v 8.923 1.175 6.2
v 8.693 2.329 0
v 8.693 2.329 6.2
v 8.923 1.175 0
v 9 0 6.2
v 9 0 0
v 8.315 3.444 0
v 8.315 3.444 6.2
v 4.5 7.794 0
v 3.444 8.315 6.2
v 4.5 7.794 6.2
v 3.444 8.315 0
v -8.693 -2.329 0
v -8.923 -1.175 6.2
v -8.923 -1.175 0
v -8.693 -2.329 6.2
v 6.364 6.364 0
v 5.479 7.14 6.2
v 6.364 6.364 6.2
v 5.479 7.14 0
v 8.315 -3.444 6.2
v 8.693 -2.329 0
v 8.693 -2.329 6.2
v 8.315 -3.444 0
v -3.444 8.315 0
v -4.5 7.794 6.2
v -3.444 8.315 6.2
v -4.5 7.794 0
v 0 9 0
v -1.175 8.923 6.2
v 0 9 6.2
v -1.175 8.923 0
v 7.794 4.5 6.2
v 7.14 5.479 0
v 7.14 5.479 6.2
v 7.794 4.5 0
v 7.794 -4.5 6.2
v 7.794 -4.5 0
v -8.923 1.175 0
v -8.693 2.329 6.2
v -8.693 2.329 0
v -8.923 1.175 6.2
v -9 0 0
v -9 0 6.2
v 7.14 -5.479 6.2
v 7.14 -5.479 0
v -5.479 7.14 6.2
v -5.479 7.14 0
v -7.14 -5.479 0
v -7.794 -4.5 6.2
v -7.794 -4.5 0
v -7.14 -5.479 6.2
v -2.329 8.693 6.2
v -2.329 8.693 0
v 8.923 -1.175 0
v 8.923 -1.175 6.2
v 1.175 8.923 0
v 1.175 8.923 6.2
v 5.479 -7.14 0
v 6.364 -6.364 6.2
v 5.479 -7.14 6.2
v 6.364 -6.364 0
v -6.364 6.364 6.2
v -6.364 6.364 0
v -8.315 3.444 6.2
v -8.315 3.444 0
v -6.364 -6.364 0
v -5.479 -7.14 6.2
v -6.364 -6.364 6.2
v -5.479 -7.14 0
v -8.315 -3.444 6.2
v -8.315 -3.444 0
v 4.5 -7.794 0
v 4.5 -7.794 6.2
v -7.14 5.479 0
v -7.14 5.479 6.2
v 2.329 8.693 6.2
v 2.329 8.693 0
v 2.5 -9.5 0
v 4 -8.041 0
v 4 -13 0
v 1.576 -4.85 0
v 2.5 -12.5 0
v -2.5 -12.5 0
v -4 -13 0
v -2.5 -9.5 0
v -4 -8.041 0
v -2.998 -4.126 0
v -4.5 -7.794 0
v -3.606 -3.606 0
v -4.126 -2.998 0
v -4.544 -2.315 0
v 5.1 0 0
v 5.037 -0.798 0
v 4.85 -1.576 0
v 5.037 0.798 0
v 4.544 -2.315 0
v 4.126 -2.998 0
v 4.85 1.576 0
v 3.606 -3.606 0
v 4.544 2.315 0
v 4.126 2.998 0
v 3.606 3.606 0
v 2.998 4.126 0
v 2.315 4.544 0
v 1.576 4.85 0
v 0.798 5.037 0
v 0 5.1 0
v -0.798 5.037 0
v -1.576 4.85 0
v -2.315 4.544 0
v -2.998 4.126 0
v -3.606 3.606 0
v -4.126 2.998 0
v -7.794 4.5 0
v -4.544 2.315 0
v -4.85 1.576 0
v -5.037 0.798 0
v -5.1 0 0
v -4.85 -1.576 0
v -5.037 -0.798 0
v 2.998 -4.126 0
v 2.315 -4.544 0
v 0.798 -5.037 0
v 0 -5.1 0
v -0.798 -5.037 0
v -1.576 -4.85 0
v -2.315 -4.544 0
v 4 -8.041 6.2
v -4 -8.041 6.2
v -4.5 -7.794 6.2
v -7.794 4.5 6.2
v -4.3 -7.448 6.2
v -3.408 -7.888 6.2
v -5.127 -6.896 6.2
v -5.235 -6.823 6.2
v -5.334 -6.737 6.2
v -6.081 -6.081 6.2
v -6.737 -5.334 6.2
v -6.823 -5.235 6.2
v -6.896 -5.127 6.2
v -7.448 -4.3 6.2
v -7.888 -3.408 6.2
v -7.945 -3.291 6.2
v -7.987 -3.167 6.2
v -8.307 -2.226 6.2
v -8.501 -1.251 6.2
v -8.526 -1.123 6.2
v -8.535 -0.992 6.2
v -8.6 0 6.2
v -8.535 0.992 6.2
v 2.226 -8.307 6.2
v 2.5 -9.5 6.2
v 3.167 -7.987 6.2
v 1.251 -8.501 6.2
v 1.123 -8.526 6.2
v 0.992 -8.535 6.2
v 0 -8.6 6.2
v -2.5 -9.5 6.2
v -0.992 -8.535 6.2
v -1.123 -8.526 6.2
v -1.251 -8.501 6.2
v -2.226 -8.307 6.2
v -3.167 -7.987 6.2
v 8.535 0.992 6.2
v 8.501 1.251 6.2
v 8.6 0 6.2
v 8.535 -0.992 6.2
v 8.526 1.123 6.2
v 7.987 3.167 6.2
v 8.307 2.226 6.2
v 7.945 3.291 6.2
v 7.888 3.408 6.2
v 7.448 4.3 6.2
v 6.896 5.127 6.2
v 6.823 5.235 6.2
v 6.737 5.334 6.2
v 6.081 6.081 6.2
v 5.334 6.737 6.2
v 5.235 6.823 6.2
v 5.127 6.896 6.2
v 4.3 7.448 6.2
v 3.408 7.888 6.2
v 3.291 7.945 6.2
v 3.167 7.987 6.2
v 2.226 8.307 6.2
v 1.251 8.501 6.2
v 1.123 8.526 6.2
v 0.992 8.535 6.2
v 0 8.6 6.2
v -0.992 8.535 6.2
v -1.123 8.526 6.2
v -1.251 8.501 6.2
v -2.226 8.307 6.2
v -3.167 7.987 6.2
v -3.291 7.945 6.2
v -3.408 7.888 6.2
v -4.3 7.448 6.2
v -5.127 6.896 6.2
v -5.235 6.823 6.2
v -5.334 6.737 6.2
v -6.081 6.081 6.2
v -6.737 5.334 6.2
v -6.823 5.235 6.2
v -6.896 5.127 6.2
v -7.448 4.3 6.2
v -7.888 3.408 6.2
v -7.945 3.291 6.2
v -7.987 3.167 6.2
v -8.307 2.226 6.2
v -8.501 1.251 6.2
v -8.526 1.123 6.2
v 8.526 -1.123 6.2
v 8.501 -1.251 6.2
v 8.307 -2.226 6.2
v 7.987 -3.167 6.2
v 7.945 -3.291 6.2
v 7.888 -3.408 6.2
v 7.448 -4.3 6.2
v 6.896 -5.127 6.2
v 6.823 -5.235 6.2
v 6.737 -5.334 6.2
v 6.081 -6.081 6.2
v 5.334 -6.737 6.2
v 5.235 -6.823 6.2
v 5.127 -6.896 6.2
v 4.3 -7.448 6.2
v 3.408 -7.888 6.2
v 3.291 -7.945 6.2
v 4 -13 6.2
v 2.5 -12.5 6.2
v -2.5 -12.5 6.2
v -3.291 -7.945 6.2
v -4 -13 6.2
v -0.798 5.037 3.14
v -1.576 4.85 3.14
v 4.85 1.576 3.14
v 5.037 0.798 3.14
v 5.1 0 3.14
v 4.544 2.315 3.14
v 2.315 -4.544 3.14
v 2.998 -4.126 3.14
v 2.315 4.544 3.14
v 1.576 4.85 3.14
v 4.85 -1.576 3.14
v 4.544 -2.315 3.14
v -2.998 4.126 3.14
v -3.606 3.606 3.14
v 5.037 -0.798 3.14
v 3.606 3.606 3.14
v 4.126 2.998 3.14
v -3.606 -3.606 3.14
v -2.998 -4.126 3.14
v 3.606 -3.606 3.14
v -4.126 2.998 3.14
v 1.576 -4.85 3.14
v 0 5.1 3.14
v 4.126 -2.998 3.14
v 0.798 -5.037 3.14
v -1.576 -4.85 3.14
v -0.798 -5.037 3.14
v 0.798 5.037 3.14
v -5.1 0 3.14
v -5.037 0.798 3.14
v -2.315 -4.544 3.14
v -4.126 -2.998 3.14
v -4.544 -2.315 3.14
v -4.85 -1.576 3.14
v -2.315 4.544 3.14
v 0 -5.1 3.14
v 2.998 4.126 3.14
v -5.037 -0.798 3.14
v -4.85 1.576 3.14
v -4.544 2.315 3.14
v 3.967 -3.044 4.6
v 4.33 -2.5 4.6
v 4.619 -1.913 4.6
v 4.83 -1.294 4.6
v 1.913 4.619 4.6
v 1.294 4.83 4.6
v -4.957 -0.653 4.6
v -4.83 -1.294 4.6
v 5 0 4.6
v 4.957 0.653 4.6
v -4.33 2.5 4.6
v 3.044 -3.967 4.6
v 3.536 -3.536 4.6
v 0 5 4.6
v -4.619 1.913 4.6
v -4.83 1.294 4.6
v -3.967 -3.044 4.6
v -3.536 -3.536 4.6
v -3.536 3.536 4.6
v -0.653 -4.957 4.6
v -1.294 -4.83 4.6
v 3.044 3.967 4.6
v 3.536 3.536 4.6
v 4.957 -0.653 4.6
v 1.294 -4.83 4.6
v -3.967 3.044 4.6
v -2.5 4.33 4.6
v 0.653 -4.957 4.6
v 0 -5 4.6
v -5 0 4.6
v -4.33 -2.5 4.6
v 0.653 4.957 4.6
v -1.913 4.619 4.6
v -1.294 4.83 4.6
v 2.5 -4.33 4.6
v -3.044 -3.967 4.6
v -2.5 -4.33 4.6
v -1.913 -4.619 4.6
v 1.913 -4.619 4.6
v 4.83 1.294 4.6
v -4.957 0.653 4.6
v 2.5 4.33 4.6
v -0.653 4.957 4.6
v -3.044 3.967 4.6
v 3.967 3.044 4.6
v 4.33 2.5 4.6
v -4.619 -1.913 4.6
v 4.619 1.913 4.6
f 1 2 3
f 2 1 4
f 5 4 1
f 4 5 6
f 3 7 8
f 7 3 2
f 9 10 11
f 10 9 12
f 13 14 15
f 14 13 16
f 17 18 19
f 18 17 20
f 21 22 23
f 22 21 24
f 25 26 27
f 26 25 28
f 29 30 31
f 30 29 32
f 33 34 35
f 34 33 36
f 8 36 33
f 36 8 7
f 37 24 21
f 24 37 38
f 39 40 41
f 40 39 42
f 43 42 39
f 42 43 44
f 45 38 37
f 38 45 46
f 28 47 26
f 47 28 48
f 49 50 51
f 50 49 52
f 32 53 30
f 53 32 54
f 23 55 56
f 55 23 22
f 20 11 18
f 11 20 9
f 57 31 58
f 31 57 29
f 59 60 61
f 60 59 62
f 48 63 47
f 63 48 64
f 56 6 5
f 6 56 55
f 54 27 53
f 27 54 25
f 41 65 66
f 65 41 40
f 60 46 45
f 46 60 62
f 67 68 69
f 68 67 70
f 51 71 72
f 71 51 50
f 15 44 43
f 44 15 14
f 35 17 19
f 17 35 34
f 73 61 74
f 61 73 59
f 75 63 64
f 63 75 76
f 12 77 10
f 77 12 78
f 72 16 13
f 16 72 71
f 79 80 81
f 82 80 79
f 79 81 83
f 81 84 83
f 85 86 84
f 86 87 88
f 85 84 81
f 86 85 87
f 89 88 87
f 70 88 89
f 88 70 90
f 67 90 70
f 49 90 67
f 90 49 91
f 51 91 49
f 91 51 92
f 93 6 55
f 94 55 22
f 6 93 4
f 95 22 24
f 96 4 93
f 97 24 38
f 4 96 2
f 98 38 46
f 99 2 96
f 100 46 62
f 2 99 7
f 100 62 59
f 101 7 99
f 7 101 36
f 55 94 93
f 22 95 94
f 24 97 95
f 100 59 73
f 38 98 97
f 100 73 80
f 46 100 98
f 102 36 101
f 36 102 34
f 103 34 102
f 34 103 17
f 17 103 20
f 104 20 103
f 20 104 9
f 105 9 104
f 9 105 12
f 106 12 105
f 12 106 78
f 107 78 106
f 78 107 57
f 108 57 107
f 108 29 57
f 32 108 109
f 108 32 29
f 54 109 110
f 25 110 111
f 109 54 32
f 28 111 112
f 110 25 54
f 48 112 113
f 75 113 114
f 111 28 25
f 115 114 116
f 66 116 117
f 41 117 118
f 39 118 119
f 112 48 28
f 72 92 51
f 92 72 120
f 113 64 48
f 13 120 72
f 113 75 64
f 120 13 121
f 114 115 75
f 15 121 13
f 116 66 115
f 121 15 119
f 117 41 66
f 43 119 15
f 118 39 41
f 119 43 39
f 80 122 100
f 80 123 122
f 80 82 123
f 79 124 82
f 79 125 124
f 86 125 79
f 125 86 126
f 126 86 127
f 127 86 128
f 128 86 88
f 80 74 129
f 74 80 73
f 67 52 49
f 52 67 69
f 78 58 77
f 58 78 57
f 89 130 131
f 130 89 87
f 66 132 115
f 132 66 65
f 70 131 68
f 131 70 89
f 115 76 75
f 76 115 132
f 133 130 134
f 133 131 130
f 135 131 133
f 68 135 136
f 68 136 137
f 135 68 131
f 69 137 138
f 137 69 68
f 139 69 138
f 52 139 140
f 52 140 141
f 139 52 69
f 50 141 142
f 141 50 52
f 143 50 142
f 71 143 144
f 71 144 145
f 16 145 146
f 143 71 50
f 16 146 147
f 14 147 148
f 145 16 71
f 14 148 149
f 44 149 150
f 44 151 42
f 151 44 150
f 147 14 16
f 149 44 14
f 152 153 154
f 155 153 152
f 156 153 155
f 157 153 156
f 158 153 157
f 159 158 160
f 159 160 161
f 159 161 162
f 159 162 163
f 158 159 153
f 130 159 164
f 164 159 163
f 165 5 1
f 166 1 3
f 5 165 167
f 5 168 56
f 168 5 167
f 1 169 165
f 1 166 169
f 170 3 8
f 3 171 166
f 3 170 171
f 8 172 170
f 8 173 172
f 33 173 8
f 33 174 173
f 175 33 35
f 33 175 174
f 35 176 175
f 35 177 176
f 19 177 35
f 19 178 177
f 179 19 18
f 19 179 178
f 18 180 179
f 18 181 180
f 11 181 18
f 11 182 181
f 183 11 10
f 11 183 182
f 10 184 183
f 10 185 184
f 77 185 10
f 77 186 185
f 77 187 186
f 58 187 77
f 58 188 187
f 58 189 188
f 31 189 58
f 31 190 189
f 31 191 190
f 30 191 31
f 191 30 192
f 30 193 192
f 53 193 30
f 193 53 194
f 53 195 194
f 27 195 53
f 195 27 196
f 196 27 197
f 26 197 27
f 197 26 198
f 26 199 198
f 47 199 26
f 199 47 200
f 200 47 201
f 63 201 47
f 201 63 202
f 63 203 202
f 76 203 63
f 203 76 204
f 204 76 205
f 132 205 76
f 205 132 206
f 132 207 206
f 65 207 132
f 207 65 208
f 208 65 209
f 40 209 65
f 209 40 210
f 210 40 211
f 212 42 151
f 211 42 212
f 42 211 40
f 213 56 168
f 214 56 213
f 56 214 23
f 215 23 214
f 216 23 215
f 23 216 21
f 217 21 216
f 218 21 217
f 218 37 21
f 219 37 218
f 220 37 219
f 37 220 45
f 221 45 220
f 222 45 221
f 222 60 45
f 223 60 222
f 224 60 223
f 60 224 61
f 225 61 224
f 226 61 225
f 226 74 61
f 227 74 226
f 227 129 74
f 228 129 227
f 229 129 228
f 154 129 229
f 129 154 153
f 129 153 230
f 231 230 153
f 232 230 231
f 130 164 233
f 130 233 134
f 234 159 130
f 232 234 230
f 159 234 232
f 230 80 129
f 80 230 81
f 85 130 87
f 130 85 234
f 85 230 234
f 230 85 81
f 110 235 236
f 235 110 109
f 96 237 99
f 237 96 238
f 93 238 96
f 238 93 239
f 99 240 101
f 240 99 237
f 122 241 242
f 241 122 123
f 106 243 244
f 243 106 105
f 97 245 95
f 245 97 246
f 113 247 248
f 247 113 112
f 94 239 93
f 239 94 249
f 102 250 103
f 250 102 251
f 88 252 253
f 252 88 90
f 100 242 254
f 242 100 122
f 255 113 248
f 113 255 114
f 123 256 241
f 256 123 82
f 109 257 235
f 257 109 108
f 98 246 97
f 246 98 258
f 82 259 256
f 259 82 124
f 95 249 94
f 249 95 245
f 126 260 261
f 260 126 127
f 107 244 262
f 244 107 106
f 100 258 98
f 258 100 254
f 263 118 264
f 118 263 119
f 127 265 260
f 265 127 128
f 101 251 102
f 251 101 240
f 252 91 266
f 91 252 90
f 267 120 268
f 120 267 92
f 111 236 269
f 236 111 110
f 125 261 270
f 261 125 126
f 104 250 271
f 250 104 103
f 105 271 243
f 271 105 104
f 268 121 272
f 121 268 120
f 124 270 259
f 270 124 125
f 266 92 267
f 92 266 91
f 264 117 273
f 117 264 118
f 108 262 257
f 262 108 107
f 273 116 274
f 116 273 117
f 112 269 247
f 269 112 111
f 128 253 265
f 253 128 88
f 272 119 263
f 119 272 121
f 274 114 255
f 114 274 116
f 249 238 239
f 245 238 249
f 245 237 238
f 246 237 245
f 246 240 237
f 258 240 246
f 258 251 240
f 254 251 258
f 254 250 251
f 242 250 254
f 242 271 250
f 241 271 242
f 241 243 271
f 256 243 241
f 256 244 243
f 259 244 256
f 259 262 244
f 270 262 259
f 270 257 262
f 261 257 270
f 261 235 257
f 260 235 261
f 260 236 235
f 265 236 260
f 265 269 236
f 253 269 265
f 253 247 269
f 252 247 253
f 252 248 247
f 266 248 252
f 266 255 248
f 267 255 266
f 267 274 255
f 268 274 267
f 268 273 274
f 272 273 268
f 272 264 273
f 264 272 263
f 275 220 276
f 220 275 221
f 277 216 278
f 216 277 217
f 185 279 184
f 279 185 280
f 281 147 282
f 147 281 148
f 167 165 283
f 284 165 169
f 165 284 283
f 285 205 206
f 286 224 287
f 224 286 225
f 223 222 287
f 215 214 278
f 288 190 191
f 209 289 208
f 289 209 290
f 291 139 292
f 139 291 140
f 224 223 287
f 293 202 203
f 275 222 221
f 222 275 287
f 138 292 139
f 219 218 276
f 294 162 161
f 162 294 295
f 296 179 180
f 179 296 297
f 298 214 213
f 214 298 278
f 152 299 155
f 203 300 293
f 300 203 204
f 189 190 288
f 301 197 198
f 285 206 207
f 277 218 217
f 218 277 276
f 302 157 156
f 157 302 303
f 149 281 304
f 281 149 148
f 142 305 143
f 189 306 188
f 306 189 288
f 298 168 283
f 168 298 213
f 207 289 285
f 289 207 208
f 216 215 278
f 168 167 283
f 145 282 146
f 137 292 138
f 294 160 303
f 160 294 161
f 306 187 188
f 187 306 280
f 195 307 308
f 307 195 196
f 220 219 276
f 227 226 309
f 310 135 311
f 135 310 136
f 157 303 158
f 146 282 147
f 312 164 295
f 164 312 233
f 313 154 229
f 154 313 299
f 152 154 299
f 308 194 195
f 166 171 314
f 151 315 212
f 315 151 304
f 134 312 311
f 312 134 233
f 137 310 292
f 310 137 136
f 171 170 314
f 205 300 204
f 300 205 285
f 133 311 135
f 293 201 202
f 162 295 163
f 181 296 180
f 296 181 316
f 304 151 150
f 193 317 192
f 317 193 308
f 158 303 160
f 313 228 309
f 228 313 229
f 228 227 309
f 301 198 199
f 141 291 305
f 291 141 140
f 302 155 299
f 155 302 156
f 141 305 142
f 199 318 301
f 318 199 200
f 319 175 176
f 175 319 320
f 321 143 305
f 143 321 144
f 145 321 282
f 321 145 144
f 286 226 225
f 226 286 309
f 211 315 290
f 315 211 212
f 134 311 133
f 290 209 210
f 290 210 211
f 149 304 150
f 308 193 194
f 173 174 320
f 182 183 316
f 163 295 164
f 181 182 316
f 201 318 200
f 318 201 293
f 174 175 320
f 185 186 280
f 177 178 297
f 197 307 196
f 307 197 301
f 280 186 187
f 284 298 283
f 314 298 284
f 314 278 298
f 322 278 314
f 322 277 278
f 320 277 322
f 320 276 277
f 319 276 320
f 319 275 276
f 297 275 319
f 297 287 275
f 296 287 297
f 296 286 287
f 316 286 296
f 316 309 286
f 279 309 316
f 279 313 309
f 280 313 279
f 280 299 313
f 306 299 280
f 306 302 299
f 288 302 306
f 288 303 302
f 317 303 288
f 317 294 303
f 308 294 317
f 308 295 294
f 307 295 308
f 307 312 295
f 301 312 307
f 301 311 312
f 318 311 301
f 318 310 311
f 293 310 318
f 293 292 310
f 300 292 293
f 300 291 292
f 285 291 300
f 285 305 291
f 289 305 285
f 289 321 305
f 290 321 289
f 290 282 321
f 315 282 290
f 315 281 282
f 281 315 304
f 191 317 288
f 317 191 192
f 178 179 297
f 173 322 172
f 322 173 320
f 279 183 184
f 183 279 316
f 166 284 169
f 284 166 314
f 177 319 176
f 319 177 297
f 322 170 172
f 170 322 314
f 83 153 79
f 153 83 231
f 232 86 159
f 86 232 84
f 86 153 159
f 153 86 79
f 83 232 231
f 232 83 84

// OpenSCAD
// H18b_umb_cup  (qty 1; frame: local; MJF PA12 or PETG)
// GENERATED by gen_halo_stl.py from halo_parts.py. Change numbers in halo_params.scad.
// Every dimension below is an expression of the names in halo_params.scad.
include <../halo_params.scad>

difference() {
    union() {
        cylinder(h = 6.2, r = 9, center = false, $fn = 48);
        translate([-4, -13, 0]) {
            cube([8, 5, 6.2], center = false);
        }
    }
    translate([0, 0, -0.01]) {
        cylinder(h = 3.15, r = 5.1, center = false, $fn = 40);
    }
    translate([0, 0, 4.6]) {
        cylinder(h = 2, r1 = 5, r2 = 9.5, center = false, $fn = 48);
    }
    translate([-2.5, -12.5, -1]) {
        cube([5, 3, 8], center = false);
    }
}
